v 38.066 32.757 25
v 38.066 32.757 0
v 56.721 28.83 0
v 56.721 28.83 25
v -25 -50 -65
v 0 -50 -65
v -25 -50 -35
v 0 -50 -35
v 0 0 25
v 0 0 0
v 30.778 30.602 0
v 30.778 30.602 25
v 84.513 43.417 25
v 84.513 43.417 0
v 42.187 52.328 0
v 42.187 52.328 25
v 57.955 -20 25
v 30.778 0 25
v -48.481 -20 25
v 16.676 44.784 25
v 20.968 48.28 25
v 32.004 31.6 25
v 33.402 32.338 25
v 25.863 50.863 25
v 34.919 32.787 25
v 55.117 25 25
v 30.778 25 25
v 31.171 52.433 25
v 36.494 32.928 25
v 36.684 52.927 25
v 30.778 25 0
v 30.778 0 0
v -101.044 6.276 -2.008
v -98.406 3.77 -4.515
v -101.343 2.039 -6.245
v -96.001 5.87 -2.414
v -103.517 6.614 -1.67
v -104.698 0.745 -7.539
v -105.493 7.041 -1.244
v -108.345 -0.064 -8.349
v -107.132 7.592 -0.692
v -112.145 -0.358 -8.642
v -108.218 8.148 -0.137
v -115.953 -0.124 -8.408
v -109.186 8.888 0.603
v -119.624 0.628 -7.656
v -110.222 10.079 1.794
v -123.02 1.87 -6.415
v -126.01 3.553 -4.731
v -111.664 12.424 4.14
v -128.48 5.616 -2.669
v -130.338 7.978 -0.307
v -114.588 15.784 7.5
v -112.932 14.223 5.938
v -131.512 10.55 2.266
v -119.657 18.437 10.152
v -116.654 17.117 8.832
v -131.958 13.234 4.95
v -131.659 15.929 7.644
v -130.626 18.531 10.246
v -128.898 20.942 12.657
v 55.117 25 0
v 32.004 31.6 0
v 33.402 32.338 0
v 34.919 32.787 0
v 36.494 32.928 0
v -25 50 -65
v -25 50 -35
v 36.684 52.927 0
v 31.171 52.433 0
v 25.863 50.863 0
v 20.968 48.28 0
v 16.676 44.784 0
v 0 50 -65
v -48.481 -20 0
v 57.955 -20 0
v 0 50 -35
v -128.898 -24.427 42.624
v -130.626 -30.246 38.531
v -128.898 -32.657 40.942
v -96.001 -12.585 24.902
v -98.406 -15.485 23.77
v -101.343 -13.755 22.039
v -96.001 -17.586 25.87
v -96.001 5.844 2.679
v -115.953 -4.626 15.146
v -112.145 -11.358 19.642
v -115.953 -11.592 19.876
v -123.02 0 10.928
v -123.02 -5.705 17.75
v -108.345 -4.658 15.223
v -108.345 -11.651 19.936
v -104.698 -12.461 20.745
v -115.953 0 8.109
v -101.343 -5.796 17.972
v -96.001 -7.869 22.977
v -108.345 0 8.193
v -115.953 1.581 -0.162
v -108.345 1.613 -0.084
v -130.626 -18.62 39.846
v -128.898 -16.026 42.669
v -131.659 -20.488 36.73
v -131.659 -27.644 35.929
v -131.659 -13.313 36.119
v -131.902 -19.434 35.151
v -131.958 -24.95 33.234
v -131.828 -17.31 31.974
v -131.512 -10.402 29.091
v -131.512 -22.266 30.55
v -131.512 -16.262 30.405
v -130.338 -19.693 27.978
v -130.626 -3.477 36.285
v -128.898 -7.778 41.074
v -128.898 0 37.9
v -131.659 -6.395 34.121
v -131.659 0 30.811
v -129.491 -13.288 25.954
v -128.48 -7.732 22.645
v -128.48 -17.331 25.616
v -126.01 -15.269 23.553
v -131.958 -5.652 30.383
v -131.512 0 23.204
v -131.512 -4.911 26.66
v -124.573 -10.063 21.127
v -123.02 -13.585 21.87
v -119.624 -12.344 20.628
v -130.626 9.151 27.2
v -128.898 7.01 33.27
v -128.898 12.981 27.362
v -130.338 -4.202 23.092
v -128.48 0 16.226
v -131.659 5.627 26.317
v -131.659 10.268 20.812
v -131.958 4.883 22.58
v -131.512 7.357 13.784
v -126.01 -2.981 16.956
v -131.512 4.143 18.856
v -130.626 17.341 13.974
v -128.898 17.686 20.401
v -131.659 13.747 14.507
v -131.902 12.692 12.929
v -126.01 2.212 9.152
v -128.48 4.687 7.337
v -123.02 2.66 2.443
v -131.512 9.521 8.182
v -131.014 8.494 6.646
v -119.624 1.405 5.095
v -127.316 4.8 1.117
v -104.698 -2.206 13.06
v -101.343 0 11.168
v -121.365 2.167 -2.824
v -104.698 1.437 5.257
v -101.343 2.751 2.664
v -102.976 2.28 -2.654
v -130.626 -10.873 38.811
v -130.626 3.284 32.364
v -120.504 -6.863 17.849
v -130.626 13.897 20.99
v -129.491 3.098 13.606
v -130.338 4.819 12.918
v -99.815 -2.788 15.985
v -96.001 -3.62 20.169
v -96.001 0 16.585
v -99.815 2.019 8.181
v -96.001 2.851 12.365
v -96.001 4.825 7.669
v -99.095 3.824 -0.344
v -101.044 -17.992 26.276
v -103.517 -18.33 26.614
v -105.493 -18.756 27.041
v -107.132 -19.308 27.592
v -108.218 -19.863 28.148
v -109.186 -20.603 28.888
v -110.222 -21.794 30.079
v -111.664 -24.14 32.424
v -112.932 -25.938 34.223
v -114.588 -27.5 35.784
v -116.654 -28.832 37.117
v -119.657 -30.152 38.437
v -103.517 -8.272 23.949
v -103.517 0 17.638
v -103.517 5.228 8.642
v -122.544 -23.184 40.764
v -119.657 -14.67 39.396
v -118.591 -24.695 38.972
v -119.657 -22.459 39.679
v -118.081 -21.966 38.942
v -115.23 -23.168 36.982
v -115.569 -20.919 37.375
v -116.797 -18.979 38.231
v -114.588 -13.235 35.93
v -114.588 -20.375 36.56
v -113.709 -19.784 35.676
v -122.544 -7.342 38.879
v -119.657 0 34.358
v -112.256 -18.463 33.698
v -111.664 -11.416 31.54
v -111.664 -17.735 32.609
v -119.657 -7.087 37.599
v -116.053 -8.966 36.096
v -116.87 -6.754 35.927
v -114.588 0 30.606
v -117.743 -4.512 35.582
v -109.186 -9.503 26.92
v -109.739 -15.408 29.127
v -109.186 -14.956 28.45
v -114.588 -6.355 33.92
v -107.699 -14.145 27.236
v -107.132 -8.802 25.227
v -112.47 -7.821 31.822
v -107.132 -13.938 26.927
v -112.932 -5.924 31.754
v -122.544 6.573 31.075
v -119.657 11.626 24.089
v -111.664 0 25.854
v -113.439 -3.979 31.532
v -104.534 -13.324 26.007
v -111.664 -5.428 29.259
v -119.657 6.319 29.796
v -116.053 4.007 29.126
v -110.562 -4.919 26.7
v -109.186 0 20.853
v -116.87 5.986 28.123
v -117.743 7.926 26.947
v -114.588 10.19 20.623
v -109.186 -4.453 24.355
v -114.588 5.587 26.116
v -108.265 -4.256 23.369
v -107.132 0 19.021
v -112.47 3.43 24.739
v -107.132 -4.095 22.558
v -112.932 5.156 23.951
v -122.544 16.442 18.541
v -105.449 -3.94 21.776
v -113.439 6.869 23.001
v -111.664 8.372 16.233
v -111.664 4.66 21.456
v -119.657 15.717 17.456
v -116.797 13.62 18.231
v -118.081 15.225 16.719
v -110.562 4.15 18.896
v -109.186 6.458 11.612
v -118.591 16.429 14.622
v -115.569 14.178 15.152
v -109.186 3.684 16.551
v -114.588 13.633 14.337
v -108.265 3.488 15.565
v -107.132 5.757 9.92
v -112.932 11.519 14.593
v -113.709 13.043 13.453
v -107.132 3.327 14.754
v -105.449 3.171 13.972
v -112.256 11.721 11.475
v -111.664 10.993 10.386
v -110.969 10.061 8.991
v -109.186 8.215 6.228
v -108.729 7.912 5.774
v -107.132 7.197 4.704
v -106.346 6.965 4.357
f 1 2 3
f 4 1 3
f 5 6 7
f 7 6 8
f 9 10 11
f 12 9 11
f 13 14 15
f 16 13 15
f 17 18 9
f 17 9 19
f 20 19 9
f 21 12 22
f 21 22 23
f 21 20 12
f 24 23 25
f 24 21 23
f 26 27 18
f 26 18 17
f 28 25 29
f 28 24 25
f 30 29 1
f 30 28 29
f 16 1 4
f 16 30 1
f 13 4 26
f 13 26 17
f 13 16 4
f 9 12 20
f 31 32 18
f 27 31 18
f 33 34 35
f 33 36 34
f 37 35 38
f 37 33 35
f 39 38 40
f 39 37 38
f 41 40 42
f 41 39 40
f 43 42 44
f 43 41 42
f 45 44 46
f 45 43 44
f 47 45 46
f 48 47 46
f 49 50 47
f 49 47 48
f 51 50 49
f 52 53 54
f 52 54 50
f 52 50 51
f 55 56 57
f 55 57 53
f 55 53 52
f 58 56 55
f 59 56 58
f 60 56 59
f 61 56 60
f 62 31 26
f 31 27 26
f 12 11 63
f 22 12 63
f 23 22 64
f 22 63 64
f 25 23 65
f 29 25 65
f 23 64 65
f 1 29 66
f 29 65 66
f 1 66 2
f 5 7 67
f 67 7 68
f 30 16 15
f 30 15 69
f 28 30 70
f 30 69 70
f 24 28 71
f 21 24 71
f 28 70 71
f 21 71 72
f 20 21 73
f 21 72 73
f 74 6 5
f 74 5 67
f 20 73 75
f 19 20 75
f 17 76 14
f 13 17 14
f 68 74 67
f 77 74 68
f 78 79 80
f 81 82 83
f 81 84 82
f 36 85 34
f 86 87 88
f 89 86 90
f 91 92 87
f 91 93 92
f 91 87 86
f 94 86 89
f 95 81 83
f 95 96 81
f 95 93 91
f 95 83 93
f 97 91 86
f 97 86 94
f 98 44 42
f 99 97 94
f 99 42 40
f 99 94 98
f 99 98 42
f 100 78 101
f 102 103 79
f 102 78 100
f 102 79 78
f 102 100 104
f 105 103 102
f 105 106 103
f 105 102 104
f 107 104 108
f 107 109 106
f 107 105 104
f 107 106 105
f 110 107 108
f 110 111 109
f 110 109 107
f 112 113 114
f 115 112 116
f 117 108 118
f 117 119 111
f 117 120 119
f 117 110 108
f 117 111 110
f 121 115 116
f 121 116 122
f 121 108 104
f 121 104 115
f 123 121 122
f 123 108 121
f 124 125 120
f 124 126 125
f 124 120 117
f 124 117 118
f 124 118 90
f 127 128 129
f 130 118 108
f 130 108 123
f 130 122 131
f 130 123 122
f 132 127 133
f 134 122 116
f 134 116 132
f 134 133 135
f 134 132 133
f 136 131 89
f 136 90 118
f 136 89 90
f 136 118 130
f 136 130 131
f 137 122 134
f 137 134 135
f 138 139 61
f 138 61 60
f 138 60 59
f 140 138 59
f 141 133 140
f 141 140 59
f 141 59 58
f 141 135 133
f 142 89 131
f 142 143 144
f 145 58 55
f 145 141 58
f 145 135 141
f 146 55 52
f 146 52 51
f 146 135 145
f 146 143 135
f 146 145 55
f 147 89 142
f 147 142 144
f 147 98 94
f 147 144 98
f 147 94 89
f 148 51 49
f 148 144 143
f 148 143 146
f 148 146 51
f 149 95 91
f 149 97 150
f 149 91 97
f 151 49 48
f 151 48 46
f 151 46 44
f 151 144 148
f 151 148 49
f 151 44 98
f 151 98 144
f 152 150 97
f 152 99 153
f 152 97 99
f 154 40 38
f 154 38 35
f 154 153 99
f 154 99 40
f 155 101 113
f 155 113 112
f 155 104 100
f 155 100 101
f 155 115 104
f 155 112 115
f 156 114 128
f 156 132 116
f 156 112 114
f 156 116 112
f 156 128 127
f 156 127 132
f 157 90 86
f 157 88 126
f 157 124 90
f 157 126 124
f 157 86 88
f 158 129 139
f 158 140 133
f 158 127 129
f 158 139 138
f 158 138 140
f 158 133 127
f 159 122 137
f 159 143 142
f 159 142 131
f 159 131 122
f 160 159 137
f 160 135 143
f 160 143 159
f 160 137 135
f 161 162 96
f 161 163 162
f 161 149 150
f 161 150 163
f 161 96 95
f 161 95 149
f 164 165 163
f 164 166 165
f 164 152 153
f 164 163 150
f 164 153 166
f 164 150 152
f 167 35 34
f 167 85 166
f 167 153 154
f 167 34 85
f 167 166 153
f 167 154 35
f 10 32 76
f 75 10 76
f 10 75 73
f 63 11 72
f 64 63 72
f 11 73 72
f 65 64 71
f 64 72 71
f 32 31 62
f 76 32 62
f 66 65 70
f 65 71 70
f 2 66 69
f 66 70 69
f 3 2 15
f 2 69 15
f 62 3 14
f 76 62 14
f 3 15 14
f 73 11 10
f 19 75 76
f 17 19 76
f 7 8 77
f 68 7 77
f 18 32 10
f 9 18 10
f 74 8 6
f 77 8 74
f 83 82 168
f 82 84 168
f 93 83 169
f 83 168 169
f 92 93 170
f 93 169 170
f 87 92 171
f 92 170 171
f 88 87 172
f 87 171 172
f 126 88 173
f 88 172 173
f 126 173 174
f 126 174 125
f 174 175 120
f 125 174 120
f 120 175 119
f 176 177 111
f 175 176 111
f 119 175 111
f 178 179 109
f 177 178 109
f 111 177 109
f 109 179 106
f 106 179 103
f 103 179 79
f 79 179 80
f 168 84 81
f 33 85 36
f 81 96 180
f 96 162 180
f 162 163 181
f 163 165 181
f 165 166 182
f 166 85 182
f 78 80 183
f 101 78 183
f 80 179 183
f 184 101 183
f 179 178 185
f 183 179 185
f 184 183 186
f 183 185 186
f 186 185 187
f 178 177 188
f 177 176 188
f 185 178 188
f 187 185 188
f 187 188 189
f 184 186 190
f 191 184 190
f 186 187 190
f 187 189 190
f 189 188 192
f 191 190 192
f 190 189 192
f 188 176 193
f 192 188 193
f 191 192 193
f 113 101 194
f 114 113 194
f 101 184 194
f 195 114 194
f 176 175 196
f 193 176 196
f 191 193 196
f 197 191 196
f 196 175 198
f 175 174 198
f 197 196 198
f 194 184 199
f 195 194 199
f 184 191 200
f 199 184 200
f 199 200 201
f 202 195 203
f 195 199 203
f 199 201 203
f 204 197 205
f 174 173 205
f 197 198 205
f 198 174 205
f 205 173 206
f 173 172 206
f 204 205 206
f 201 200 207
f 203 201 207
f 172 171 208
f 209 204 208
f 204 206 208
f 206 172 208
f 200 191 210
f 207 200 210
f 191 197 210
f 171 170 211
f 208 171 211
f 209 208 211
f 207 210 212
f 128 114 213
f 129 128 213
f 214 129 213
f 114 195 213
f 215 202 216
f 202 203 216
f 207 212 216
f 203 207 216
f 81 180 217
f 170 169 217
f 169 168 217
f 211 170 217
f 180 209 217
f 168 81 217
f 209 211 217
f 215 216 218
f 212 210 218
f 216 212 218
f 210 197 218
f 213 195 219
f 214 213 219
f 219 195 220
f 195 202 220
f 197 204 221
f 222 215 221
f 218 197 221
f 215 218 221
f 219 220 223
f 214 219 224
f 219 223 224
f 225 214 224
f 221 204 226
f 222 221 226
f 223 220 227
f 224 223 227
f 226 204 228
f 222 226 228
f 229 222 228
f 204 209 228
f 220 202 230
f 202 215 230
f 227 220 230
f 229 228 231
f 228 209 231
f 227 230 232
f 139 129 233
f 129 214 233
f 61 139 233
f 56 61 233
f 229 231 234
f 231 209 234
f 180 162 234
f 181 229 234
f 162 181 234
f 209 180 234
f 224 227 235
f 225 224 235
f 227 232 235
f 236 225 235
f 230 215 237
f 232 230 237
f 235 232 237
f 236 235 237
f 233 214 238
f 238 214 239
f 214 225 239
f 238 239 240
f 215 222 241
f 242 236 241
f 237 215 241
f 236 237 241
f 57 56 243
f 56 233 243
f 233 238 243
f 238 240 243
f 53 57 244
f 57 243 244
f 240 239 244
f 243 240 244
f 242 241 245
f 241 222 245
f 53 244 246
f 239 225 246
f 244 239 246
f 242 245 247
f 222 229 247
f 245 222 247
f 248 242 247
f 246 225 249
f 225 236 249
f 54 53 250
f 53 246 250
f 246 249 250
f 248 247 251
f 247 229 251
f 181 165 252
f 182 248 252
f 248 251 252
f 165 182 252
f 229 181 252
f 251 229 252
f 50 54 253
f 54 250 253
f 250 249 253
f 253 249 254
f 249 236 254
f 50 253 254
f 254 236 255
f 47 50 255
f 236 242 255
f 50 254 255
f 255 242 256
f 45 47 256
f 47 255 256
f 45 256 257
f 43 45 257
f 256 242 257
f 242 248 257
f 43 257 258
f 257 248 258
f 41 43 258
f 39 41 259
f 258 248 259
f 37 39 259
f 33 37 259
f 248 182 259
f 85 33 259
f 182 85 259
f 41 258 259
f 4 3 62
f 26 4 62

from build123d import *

# Parameters (mm, degrees)
F1_DEPTH      = 25
F2_W          = 18.6549739079
F2_H          = 25
F2_W_2        = 7.2887051135
F3_DEPTH      = 25
F5_ANGLE_BACK = 45
F5_ANGLE      = 90
F6_W          = 100
F6_H          = 30
F7_DEPTH      = 25


with BuildPart() as f1:
    # F0 (on Top) → F1 (new body)
    with BuildSketch(Plane.XY):
        with BuildLine():
            Line((84.5134988863, 43.4171267656), (42.1865175313, 52.3280707933))
            ThreePointArc((42.1865175313, 52.3280707933), (28.4781748194, 51.779293713), (16.676049634, 44.7843199962))
            Line((16.676049634, 44.7843199962), (-48.480621179, -20))
            Line((-48.480621179, -20), (57.9547037237, -20))
            Line((57.9547037237, -20), (84.5134988863, 43.4171267656))
        make_face()
        with BuildLine():
            Line((44.6475334466, 0), (0, 0))
            Line((0, 0), (30.777602538, 30.6017177774))
            ThreePointArc((30.777602538, 30.6017177774), (34.1496383053, 32.6002816965), (38.0663076515, 32.757075148))
            Line((38.0663076515, 32.757075148), (56.7212815594, 28.8297119624))
            Line((56.7212815594, 28.8297119624), (44.6475334466, 0))
        make_face(mode=Mode.SUBTRACT)
    extrude(amount=F1_DEPTH)

    # F2 (on Front) → F3 (join)
    with BuildSketch(Plane.XZ):
        with Locations((47.3937946055, 12.5)):
            Rectangle(F2_W, F2_H)
        with Locations((34.4219550948, 12.5)):
            Rectangle(F2_W_2, F2_H)
    extrude(amount=-F3_DEPTH)


with BuildPart() as f5:
    # F4 (on Front) → F5 (revolve)
    with BuildSketch(Plane.XZ, mode=Mode.PRIVATE) as f5_sk:
        with BuildLine():
            add(Edge.make_bspline(
                [(-128.8978096897, 37.9002092083), (-124.9873321019, 36.616120217), (-117.7613525942, 34.2380457977), (-111.7276169482, 27.87889312), (-109.5251548165, 17.8794732046), (-100.7738921716, 17.0393126701), (-96.0005752069, 16.5854462994)],
                knots=[0, 0, 0, 0, 0.2672312092, 0.4927808556, 0.7228802436, 1, 1, 1, 1], degree=3))
            ThreePointArc((-128.8978096897, 37.9002092083), (-123.0196616187, 10.9283510514), (-96.0005752069, 16.5854462994))
        make_face()
    revolve(f5_sk.sketch.rotate(Axis((4.7370412723, -20, 0), (-1, 0, 0)), -F5_ANGLE_BACK), axis=Axis((4.7370412723, -20, 0), (-1, 0, 0)), revolution_arc=F5_ANGLE)


with BuildPart() as f7:
    # F6 (on Right) → F7 (new body)
    with BuildSketch(Plane.YZ):
        with Locations((0, -50)):
            Rectangle(F6_W, F6_H)
    extrude(amount=-F7_DEPTH)


solid = Compound([f1.part, f5.part, f7.part])
